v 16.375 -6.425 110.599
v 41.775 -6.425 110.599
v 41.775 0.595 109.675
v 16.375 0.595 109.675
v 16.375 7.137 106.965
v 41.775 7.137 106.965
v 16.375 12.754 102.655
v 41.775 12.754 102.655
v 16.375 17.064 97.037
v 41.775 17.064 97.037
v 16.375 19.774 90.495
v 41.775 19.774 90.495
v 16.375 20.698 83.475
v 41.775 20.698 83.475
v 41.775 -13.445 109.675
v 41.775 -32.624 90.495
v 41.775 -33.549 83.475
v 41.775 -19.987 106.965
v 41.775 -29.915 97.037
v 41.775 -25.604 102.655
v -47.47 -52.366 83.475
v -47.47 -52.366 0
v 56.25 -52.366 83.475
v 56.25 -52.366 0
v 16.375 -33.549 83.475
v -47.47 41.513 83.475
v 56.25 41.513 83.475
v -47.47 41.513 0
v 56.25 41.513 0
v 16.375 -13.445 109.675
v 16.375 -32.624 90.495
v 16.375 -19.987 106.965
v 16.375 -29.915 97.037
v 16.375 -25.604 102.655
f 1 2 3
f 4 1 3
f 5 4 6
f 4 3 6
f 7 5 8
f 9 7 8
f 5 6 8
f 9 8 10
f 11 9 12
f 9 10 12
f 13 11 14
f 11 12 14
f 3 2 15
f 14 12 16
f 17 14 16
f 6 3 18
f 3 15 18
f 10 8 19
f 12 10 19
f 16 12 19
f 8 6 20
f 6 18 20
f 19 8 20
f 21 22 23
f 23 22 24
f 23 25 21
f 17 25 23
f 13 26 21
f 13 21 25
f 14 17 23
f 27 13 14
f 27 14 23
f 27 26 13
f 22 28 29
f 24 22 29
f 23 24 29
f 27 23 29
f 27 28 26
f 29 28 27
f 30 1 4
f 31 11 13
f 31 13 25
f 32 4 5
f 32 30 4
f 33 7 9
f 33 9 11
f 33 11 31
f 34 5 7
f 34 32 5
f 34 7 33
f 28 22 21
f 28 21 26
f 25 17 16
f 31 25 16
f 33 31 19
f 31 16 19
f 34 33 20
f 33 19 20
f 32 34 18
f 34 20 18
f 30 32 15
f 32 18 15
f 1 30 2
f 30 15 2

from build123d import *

# Parameters (mm, degrees)
F0_W     = 103.7199497223
F0_H     = 93.8791483641
F1_DEPTH = 83.4754128009
F5_DEPTH = 25.4


with BuildPart() as f1:
    # F0 (on Top) → F1 (new body)
    with BuildSketch(Plane.XY):
        with Locations((4.3902695179, -5.4262652993)):
            Rectangle(F0_W, F0_H)
    extrude(amount=F1_DEPTH)

    # F4 (on face) → F5 (join)
    with BuildSketch(Plane(origin=(41.7745485902, 0, 0), x_dir=(0, -1, 0), z_dir=(-1, 0, 0))):
        with BuildLine():
            ThreePointArc((33.5486456752, 83.4754128009), (25.6043620093, 102.6546101703), (6.4251646399, 110.5988938361))
            Line((6.4251646399, 110.5988938361), (6.4251646399, 83.4754128009))
            Line((6.4251646399, 83.4754128009), (33.5486456752, 83.4754128009))
        make_face()
        with BuildLine():
            Line((6.4251646399, 83.4754128009), (6.4251646399, 110.5988938361))
            ThreePointArc((6.4251646399, 110.5988938361), (-12.7540327294, 102.6546101703), (-20.6983163953, 83.4754128009))
            Line((-20.6983163953, 83.4754128009), (6.4251646399, 83.4754128009))
        make_face()
    extrude(amount=F5_DEPTH)


solid = f1.part
